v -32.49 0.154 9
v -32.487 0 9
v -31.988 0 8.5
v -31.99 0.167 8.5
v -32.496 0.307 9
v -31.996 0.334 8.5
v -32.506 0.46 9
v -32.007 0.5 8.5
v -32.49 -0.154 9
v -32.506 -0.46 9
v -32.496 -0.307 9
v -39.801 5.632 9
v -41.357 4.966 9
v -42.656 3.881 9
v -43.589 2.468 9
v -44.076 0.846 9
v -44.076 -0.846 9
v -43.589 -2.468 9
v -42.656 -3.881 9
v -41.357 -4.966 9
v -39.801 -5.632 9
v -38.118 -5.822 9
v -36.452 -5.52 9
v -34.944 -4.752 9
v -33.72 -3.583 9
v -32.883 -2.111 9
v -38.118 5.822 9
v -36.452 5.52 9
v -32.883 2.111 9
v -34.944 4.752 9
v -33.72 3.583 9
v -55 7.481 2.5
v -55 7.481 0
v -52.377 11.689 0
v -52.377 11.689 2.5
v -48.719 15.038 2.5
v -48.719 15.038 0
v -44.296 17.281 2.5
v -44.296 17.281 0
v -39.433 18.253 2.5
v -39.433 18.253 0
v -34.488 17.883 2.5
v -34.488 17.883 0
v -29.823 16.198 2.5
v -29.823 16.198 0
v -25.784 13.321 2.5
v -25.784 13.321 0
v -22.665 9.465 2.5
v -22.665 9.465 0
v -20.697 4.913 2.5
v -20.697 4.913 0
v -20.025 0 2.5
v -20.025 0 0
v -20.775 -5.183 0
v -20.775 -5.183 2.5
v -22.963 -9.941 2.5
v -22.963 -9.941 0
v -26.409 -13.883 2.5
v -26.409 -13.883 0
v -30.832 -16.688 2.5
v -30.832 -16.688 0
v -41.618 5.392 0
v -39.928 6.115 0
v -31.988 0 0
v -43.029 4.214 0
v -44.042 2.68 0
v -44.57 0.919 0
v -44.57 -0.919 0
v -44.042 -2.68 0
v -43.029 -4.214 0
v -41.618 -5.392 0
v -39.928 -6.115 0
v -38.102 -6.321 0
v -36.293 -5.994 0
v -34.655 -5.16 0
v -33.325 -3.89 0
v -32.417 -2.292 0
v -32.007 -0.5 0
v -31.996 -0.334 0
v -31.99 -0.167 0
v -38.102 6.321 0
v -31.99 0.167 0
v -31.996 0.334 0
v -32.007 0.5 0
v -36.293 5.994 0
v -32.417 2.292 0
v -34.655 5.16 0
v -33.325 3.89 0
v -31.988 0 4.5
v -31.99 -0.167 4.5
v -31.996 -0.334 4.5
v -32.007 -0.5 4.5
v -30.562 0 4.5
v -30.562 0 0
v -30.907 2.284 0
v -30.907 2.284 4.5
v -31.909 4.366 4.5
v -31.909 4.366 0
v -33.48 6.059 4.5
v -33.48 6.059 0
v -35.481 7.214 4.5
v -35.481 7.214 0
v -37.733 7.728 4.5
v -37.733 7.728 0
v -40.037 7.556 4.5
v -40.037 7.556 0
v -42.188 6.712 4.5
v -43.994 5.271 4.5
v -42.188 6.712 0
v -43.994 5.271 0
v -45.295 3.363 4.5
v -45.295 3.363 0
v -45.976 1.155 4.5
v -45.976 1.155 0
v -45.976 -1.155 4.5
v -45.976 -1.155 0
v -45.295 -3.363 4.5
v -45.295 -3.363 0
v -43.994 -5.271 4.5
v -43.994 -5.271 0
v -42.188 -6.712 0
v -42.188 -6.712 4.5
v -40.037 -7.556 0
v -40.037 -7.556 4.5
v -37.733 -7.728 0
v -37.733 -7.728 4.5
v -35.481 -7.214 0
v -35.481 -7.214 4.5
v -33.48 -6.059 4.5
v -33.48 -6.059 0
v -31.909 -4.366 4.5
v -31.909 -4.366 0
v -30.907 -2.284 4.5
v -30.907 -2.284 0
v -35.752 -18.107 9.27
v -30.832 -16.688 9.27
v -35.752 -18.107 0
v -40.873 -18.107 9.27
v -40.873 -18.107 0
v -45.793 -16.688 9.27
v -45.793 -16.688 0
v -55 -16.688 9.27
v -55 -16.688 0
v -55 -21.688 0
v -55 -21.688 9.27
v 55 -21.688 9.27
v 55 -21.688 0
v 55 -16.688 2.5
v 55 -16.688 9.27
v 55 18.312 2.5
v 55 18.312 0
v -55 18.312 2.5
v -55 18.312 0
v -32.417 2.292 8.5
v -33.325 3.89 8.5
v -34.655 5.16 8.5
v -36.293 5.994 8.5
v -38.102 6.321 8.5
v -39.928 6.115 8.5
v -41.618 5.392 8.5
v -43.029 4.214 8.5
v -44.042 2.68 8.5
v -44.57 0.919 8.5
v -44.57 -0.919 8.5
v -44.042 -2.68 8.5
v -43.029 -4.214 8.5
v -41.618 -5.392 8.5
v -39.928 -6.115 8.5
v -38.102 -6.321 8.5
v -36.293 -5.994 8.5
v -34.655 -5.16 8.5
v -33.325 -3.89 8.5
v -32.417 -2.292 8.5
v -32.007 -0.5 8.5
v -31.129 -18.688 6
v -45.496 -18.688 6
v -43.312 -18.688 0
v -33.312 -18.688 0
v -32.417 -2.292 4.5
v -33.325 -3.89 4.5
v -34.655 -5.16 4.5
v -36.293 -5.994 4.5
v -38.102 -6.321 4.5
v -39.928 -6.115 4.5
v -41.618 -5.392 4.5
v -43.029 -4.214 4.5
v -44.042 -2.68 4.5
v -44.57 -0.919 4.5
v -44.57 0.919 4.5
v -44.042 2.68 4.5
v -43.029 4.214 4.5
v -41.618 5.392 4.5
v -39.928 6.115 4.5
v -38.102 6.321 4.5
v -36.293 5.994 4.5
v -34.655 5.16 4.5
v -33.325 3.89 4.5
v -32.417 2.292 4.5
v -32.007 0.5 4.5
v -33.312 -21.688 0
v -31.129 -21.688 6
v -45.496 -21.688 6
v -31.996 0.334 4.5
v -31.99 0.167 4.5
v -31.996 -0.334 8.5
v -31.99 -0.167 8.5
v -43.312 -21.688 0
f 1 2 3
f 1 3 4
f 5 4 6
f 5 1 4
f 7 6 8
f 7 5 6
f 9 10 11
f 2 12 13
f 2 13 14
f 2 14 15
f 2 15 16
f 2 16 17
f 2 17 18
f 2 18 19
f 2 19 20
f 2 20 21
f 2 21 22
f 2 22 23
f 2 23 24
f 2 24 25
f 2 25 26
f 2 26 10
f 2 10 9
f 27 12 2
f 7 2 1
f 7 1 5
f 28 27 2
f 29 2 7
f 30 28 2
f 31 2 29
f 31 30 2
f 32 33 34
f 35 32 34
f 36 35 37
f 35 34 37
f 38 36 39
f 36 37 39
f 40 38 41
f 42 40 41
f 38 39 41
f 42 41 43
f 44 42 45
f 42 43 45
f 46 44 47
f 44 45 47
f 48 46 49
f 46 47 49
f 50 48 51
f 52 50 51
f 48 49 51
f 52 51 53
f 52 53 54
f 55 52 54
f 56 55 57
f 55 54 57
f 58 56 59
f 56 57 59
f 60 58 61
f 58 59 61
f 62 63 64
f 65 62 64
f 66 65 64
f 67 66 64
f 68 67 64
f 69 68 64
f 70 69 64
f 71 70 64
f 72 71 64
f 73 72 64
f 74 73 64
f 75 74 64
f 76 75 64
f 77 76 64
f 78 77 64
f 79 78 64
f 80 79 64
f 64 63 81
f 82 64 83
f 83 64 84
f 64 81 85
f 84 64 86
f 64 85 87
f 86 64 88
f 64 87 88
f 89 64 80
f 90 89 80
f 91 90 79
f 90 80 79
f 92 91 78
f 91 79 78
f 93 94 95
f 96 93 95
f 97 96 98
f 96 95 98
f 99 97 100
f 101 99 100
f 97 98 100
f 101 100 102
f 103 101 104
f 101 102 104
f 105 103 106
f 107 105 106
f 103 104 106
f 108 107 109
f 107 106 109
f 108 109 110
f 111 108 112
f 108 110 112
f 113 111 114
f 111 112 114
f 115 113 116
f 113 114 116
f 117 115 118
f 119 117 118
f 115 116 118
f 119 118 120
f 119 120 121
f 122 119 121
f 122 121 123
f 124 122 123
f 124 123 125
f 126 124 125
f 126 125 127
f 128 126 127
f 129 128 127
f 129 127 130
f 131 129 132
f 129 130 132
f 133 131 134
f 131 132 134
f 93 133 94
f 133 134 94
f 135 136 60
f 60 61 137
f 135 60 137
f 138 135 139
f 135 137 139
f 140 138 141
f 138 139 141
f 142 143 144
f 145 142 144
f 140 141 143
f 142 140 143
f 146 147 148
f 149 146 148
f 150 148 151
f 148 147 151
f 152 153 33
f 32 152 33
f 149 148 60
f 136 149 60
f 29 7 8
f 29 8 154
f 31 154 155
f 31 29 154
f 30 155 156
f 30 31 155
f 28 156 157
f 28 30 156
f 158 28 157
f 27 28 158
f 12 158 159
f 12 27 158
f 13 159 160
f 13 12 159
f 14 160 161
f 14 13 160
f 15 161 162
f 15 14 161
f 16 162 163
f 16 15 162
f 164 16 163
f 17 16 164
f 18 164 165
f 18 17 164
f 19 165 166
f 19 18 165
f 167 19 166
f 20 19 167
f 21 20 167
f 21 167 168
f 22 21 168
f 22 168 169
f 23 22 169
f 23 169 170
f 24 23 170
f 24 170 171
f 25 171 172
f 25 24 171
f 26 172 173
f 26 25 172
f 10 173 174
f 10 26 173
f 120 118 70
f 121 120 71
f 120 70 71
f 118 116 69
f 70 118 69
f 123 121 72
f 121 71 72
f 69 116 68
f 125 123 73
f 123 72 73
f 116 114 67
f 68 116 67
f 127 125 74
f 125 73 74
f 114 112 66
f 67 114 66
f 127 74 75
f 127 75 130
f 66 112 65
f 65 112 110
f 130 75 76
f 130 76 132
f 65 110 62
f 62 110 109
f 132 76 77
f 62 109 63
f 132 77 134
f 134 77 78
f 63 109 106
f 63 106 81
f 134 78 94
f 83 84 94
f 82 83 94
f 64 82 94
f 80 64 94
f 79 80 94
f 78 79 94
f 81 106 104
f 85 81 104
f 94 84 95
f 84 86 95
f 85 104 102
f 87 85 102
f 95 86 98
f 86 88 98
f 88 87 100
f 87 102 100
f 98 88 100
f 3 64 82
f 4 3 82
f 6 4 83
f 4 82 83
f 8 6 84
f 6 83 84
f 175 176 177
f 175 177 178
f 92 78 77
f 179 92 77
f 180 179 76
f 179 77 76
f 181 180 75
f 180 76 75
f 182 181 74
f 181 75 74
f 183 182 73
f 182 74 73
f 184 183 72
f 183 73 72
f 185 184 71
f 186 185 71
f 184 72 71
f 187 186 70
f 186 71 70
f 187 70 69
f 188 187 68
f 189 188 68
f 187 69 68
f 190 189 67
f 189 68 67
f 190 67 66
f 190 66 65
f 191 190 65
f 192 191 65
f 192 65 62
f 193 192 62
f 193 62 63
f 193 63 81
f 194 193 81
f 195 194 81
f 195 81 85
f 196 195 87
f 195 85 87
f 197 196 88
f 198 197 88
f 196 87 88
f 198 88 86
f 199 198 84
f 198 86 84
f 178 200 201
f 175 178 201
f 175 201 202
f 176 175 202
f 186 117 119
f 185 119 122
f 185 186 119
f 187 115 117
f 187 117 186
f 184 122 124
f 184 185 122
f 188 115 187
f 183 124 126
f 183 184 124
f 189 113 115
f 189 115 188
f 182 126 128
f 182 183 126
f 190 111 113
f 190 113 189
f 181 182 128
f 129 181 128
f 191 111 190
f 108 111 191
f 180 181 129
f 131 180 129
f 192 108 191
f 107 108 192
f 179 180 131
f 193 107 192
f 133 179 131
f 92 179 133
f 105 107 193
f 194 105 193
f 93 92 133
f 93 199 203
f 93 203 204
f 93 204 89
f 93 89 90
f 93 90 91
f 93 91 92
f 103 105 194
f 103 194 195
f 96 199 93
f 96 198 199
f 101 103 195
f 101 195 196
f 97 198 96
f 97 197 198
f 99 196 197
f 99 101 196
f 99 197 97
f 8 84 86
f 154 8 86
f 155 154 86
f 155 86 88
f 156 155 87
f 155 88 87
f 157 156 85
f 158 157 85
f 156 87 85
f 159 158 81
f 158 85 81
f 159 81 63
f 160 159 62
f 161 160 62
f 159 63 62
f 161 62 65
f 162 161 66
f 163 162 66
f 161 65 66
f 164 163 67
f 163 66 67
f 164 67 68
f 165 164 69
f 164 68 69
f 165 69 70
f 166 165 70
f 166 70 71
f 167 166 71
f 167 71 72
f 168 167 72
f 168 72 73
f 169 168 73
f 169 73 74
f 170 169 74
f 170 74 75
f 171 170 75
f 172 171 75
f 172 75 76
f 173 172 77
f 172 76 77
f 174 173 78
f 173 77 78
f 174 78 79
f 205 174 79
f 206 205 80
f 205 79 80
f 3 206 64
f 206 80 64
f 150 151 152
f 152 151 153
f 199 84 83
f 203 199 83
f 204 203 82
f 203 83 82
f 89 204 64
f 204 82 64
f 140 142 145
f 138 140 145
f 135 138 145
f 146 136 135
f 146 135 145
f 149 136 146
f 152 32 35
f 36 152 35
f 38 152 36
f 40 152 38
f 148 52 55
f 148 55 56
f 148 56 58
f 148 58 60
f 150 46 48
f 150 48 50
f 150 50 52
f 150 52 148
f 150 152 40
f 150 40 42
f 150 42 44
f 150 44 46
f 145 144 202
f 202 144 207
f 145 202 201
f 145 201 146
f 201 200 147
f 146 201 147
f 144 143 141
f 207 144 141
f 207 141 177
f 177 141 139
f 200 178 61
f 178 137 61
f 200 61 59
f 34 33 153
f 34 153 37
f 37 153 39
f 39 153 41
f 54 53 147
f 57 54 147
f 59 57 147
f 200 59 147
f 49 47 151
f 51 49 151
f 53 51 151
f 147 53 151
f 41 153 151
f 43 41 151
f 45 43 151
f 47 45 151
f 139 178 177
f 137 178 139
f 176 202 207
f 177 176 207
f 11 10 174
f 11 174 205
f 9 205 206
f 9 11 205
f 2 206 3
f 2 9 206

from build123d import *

# Parameters (mm, degrees)
F1_DEPTH = 2.5
F0_R     = 7.75
F2_DEPTH = 4.5
F3_DEPTH = 9
F4_DEPTH = 9.27
F5_SIZE  = 0.5
F8_W     = 10
F8_H     = 6
F9_DEPTH = 3


# Not quite as in the source:
# - a feature of the source that left no trace in its solid (it failed there, or was rolled back) is left out


with BuildPart() as f1:
    # F0 (on Top) → F1 (new body)
    with BuildSketch(Plane.XY):
        with BuildLine():
            Line((55, 18.3124991804), (-55, 18.3124991804))
            Line((-55, 18.3124991804), (-55, 7.4806416837))
            ThreePointArc((-55, 7.4806416837), (-34.4875817002, 17.8830270438), (-20.025, 0))
            ThreePointArc((-20.025, 0), (-22.9626646419, -9.9405840236), (-30.8318583163, -16.6875))
            Line((-30.8318583163, -16.6875), (55, -16.6875))
            Line((55, -16.6875), (55, 18.3124991804))
        make_face()
    extrude(amount=F1_DEPTH)

    # F0 (on Top) → F4 (join)
    with BuildSketch(Plane.XY):
        with BuildLine():
            Line((55, -21.6875008196), (55, -16.6875))
            Line((55, -16.6875), (-30.8318583163, -16.6875))
            ThreePointArc((-30.8318583163, -16.6875), (-38.3125, -18.2875), (-45.7931416837, -16.6875))
            Line((-45.7931416837, -16.6875), (-55, -16.6875))
            Line((-55, -16.6875), (-55, -21.6875008196))
            Line((-55, -21.6875008196), (55, -21.6875008196))
        make_face()
    extrude(amount=F4_DEPTH)

    # F8 (on face) → F9 (cut)
    with BuildSketch(Plane.XZ.offset(21.6875008196)):
        Polygon((-33.3125, 6), (-33.3125, 0), (-31.1286785944, 6), align=None)
        with Locations((-38.3125, 3)):
            Rectangle(F8_W, F8_H)
        Polygon((-45.4963214056, 6), (-43.3125, 0), (-43.3125, 6), align=None)
    extrude(amount=-F9_DEPTH, mode=Mode.SUBTRACT)


with BuildPart() as f2:
    # F0 (on Top) → F2 (new body)
    with BuildSketch(Plane.XY):
        with Locations((-38.3125, 0)):
            Circle(F0_R)
        with BuildLine():
            ThreePointArc((-32.0072938178, 0.5), (-31.9924503917, 0.2501958209), (-31.9875, 0))
            ThreePointArc((-31.9875, 0), (-31.9924503917, -0.2501958209), (-32.0072938178, -0.5))
            ThreePointArc((-32.0072938178, -0.5), (-44.6375, 0), (-32.0072938178, 0.5))
        make_face(mode=Mode.SUBTRACT)
    extrude(amount=F2_DEPTH)


with BuildPart() as f3:
    # F0 (on Top) → F3 (new body)
    with BuildSketch(Plane.XY):
        with BuildLine():
            Line((-32.4964055004, 0.3219779063), (-32.0072938178, 0.5))
            ThreePointArc((-32.0072938178, 0.5), (-44.6375, 0), (-32.0072938178, -0.5))
            Line((-32.0072938178, -0.5), (-32.4964055004, -0.3219779063))
            ThreePointArc((-32.4964055004, -0.3219779063), (-44.1375, 0), (-32.4964055004, 0.3219779063))
        make_face()
        with BuildLine():
            ThreePointArc((-32.0072938178, -0.5), (-31.9924503917, -0.2501958209), (-31.9875, 0))
            ThreePointArc((-31.9875, 0), (-31.9924503917, 0.2501958209), (-32.0072938178, 0.5))
            Line((-32.0072938178, 0.5), (-32.4964055004, 0.3219779063))
            ThreePointArc((-32.4964055004, 0.3219779063), (-32.4897268007, 0.1610505201), (-32.4875, 0))
            ThreePointArc((-32.4875, 0), (-32.4897268007, -0.1610505201), (-32.4964055004, -0.3219779063))
            Line((-32.4964055004, -0.3219779063), (-32.0072938178, -0.5))
        make_face()
        with BuildLine():
            ThreePointArc((-32.4875, 0), (-32.4897268007, 0.1610505201), (-32.4964055004, 0.3219779063))
            ThreePointArc((-32.4964055004, 0.3219779063), (-44.1375, 0), (-32.4964055004, -0.3219779063))
            ThreePointArc((-32.4964055004, -0.3219779063), (-32.4897268007, -0.1610505201), (-32.4875, 0))
        make_face()
    extrude(amount=F3_DEPTH)

    # F5
    f5_edges = [f3.edges().sort_by_distance(p)[0] for p in [
        (-44.617706, 0.5, 9),
    ]]
    chamfer(f5_edges, length=F5_SIZE)


solid = Compound([f1.part, f2.part, f3.part])
